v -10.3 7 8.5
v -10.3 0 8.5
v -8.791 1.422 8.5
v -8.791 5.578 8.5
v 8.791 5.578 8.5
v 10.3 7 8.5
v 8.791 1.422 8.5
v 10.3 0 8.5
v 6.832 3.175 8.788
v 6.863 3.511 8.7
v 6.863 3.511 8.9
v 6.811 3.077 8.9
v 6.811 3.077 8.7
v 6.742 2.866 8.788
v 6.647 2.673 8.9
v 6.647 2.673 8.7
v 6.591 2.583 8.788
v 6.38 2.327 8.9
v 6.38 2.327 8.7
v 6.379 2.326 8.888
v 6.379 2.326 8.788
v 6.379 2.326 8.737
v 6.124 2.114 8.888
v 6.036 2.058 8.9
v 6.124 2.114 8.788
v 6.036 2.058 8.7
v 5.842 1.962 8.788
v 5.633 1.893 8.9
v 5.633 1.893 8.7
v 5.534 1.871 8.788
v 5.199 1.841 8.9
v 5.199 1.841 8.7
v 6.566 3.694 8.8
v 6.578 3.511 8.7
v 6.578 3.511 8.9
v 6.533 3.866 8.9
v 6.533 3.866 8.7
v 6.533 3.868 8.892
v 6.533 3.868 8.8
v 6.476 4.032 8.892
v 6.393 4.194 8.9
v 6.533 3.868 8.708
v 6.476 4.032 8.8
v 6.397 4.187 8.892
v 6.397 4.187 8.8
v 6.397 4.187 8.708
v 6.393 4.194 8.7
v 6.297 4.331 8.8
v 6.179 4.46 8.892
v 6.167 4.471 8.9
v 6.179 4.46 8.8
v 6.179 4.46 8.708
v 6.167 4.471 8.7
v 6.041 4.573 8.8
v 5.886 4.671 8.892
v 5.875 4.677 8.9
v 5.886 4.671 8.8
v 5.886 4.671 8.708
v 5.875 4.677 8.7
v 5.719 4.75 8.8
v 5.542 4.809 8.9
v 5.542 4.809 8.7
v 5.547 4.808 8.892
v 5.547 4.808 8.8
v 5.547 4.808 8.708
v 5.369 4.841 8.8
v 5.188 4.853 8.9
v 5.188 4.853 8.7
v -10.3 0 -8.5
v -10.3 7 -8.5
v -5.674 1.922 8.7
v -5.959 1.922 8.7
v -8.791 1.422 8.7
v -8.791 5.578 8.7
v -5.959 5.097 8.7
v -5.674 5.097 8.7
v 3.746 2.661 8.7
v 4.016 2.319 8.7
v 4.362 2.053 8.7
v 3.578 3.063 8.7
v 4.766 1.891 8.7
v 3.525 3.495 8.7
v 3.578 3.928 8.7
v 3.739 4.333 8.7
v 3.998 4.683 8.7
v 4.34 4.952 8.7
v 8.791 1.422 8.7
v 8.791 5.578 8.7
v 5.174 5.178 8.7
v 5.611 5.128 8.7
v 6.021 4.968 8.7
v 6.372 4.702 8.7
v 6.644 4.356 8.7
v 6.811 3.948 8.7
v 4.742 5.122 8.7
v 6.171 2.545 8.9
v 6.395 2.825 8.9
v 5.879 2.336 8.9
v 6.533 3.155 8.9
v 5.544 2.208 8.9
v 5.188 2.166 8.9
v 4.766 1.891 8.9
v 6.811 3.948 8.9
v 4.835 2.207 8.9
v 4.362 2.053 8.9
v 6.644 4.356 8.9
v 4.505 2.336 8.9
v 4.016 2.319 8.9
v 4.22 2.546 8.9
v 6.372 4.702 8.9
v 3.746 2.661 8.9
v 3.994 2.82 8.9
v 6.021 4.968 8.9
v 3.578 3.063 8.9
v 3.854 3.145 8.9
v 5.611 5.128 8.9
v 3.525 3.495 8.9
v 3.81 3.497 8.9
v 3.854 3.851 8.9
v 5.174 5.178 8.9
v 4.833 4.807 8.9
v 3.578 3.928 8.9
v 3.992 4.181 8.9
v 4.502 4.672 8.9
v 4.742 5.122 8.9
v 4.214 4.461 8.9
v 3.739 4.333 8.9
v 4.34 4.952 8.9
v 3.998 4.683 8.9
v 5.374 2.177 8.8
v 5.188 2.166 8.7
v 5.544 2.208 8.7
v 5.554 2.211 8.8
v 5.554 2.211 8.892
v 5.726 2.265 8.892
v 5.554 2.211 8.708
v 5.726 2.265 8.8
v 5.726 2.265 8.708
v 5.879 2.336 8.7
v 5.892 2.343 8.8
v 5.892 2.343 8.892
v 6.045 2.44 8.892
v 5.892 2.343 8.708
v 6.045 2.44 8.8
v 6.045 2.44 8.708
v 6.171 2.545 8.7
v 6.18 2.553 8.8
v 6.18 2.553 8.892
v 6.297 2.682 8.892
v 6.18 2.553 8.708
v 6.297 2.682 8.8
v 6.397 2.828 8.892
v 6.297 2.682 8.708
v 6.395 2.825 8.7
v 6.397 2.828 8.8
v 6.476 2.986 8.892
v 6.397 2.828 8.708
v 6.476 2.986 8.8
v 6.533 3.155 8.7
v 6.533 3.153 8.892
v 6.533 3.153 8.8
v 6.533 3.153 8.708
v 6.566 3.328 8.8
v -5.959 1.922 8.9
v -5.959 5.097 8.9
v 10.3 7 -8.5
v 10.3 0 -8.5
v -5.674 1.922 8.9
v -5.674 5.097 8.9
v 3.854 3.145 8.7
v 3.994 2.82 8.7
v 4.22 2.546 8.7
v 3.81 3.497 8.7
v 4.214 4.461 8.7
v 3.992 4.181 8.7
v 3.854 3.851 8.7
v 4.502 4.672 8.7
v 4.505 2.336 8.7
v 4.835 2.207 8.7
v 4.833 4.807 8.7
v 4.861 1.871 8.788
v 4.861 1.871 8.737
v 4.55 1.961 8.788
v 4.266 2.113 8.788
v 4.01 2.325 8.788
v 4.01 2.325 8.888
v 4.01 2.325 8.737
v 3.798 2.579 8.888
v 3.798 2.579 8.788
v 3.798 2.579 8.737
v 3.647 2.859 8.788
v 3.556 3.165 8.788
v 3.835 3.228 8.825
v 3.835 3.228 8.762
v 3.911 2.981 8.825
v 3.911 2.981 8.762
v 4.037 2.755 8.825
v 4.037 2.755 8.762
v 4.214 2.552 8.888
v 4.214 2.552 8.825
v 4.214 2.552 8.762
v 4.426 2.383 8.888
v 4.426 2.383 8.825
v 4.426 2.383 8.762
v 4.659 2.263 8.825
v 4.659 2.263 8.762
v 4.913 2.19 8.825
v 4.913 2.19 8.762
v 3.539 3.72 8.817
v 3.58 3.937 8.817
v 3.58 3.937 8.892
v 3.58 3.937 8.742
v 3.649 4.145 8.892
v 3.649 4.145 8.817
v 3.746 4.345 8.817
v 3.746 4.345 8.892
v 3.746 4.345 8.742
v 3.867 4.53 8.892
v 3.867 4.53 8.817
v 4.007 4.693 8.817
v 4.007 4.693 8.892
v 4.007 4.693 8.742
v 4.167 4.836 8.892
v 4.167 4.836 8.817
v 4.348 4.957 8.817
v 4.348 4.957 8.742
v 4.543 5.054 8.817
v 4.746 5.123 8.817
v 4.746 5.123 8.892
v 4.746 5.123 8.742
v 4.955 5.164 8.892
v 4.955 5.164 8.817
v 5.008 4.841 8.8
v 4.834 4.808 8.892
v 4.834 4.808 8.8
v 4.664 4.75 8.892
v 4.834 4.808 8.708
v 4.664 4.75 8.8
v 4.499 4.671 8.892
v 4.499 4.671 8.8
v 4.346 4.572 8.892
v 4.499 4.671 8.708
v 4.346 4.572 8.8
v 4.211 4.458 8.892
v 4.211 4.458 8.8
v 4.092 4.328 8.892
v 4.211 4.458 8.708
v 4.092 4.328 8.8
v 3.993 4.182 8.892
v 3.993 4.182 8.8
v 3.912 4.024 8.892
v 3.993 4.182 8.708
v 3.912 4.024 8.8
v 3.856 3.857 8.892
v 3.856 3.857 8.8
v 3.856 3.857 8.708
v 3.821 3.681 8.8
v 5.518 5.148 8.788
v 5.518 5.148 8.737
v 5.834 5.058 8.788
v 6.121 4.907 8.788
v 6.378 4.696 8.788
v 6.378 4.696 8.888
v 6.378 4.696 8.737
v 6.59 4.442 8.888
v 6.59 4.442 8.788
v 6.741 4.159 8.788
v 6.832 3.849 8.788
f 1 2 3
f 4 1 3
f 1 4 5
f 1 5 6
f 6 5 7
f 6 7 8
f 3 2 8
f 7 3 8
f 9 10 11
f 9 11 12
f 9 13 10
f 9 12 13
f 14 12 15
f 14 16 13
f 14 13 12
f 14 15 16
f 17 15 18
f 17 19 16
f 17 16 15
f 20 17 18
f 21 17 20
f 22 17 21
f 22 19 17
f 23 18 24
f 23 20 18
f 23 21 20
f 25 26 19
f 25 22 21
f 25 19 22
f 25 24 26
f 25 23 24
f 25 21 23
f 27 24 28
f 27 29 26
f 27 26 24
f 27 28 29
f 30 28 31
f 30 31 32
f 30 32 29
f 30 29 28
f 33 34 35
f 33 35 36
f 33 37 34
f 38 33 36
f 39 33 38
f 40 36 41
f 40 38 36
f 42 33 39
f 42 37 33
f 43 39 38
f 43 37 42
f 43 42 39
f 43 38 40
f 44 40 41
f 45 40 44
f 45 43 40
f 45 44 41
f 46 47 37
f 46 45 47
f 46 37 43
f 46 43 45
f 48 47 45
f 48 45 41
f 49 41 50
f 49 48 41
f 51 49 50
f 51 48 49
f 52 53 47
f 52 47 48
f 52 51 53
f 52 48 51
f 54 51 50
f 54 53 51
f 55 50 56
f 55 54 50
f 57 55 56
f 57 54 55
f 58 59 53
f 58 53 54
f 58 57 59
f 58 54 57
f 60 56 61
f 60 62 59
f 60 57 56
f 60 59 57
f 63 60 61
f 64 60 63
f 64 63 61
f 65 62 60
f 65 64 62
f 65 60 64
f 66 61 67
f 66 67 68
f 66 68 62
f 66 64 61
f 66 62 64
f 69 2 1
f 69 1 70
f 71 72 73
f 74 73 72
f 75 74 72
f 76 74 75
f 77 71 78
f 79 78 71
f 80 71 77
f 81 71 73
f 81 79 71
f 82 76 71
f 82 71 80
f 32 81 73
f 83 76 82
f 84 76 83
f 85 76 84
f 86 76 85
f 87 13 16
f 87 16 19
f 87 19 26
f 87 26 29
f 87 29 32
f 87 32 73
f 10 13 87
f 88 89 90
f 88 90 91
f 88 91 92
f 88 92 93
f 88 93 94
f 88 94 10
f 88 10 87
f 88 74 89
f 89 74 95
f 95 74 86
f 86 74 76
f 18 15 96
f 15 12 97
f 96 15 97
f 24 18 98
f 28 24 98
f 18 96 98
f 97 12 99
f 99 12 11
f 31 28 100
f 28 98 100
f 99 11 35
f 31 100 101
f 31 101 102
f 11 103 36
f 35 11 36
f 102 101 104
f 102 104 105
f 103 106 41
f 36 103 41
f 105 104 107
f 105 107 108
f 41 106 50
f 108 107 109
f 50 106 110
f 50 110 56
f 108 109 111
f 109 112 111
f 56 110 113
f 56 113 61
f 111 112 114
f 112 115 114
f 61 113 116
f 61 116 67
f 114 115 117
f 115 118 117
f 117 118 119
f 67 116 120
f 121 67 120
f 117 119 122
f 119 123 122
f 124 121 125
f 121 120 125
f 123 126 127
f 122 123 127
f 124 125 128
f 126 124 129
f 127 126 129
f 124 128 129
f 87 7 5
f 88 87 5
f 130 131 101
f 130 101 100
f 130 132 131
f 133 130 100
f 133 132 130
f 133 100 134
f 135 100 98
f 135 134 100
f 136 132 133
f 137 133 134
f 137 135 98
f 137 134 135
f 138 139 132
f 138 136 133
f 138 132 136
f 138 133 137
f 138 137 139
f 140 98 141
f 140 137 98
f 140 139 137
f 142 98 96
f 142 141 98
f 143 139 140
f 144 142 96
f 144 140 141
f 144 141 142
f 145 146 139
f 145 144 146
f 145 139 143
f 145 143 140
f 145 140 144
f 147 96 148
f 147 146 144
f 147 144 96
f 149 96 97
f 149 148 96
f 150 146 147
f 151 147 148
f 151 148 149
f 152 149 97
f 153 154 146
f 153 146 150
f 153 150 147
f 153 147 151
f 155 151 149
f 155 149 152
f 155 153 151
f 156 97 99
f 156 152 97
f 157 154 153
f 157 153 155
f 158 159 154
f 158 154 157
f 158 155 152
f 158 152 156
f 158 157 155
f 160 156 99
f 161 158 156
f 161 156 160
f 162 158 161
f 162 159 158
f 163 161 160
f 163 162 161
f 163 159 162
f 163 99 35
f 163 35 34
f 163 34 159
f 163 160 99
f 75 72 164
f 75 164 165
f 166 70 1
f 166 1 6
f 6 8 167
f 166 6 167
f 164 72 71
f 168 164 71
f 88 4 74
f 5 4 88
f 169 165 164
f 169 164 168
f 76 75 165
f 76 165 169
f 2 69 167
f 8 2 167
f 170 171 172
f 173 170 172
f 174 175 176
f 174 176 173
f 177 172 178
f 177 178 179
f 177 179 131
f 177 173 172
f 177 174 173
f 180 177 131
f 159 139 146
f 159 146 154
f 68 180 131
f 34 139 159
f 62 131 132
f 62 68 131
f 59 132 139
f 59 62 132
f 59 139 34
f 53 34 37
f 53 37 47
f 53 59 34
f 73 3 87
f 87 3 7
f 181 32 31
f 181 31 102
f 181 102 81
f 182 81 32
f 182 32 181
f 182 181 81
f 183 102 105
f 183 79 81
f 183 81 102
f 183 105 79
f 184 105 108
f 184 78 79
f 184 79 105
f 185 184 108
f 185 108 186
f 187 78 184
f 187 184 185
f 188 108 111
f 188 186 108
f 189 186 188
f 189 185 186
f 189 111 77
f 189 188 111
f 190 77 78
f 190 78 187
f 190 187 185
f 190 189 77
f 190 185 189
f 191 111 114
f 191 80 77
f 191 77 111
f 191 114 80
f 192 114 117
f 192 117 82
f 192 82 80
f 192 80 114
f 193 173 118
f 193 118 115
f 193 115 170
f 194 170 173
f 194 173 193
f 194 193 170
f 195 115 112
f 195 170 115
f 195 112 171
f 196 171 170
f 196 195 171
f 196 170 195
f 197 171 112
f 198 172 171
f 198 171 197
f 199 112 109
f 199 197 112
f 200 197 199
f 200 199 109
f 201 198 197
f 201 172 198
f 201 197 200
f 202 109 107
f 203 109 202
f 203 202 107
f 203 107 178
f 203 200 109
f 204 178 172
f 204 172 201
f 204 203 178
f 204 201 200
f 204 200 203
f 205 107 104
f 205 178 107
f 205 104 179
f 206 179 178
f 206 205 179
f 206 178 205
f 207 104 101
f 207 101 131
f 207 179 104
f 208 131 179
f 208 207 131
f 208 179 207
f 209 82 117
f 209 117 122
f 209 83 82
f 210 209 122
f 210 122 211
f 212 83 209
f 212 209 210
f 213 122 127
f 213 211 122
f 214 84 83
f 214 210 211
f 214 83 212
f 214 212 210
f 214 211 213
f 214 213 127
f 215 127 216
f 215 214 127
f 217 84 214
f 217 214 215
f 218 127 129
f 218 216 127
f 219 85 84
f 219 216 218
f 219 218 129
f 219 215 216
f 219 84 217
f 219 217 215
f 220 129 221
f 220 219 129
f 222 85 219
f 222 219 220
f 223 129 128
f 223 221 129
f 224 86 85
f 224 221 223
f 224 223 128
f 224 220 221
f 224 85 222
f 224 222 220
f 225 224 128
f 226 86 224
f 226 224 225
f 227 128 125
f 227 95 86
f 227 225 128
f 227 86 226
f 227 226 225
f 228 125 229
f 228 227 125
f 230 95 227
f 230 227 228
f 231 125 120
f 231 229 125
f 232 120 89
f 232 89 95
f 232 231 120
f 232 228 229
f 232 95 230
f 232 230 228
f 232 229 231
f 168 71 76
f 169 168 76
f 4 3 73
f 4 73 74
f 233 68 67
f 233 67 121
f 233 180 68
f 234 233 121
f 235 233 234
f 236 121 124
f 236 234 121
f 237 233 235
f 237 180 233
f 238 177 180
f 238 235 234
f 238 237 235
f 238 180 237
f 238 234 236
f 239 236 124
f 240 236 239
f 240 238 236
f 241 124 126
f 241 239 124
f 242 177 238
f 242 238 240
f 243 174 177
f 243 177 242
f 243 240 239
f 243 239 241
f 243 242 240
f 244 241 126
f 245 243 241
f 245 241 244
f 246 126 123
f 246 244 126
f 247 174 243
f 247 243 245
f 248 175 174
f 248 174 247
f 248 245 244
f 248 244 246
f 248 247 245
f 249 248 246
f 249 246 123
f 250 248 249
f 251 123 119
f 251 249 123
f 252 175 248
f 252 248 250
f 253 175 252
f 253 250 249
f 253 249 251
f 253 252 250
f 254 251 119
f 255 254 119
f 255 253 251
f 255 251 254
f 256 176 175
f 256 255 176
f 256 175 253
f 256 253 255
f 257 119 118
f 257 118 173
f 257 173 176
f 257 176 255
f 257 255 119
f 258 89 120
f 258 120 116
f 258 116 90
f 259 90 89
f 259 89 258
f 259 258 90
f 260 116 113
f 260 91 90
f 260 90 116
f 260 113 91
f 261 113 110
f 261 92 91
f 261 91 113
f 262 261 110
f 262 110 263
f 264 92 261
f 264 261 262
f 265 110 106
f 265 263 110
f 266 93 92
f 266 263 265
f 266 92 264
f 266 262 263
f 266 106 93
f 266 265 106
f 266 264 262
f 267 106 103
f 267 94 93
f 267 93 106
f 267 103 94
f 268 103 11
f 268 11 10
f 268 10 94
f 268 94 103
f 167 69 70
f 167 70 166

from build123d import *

# Parameters (mm, degrees)
SKETCH1_W           = 20.6
SKETCH1_H           = 17
BOSS_EXTRUDE1_DEPTH = 7
SKETCH2_W           = 17.582410578
SKETCH2_H           = 4.15503942
BOSS_EXTRUDE2_DEPTH = 0.2
SKETCH3_W           = 0.284935897
SKETCH3_H           = 3.175
BOSS_EXTRUDE3_DEPTH = 0.2


with BuildPart() as part:
    # Sketch1 → Boss-Extrude1 (new body)
    with BuildSketch(Plane(origin=(0, 0, 0), x_dir=(1, 0, 0), z_dir=(0, 1, 0))):
        Rectangle(SKETCH1_W, SKETCH1_H)
    extrude(amount=BOSS_EXTRUDE1_DEPTH)

    # Sketch2 → Boss-Extrude2 (add)
    with BuildSketch(Plane.XY.offset(8.5)):
        with Locations((0, 3.5)):
            Rectangle(SKETCH2_W, SKETCH2_H)
    extrude(amount=BOSS_EXTRUDE2_DEPTH)

    # Sketch3 → Boss-Extrude3 (add)
    # profile 1 of 2: a face of its own
    with BuildSketch(Plane.XY.offset(8.7)):
        with Locations((-5.816789994, 3.509432337)):
            Rectangle(SKETCH3_W, SKETCH3_H)
    # profile 2 of 2: a face of its own
    with BuildSketch(Plane.XY.offset(8.7)):
        with BuildLine():
            add(Edge.make_bspline(
                [(5.173594622, 5.178342594), (5.232384832, 5.176853538), (5.347853656, 5.173928908), (5.517557313, 5.151541436), (5.679568578, 5.112810618), (5.835207204, 5.061227769), (5.982611547, 4.992417005), (6.122891114, 4.909245478), (6.255712135, 4.810841833), (6.379284388, 4.697966749), (6.492366051, 4.575154616), (6.591993819, 4.444092511), (6.675489328, 4.305572884), (6.744056435, 4.160011987), (6.797848745, 4.007739016), (6.834968163, 3.847942171), (6.8586792, 3.681656816), (6.861451226, 3.568239589), (6.862857443, 3.510704373)],
                knots=[0, 0, 0, 0, 1.065120563, 2.091984664, 3.0946048, 4.079830382, 5.057816894, 6.036188127, 7.030412546, 8.04752943, 9.064399622, 10.05169764, 11.02544977, 11.989514704, 12.962713494, 13.945757189, 14.957906945, 16, 16, 16, 16], degree=3))
            add(Edge.make_bspline(
                [(6.862857443, 3.510704373), (6.861451432, 3.453592975), (6.858680023, 3.341019794), (6.834941204, 3.175789669), (6.797711154, 3.016957394), (6.744555969, 2.864788124), (6.676315714, 2.719121334), (6.592264237, 2.580340311), (6.493257568, 2.448399559), (6.38058421, 2.324744499), (6.257756122, 2.211353936), (6.126011523, 2.112548956), (5.988313297, 2.027527786), (5.84288949, 1.95968831), (5.691668742, 1.905466639), (5.533297635, 1.868498182), (5.368518261, 1.844652079), (5.256149565, 1.841913853), (5.199035327, 1.840522081)],
                knots=[0, 0, 0, 0, 1.043624062, 2.057103931, 3.04512605, 4.022047818, 4.998200453, 5.980619268, 6.982898556, 8.009068085, 9.034988726, 10.034168286, 11.015286542, 11.987931943, 12.962482838, 13.94673481, 14.956375938, 16, 16, 16, 16], degree=3))
            add(Edge.make_bspline(
                [(5.199035327, 1.840522081), (5.141500409, 1.841927596), (5.028083771, 1.844698241), (4.86158946, 1.868448515), (4.701680364, 1.905588127), (4.548813774, 1.958664544), (4.402904445, 2.027260174), (4.263667012, 2.110902718), (4.131660357, 2.210150625), (4.007978916, 2.322787446), (3.894813572, 2.445407354), (3.796153281, 2.576792714), (3.712491928, 2.714365878), (3.64412662, 2.858508632), (3.590002431, 3.008524155), (3.553077346, 3.165413131), (3.529186876, 3.328281112), (3.526433836, 3.439172884), (3.52503693, 3.49543995)],
                knots=[0, 0, 0, 0, 1.053102029, 2.075944431, 3.073151272, 4.055350789, 5.033113405, 6.020478099, 7.024410459, 8.052272461, 9.079885166, 10.07527673, 11.055994387, 12.023226415, 12.992069828, 13.970394897, 14.97016774, 16, 16, 16, 16], degree=3))
            add(Edge.make_bspline(
                [(3.52503693, 3.49543995), (3.525521921, 3.533206728), (3.526485784, 3.60826384), (3.538089676, 3.719721399), (3.554927791, 3.829386495), (3.579059526, 3.936947284), (3.610620538, 4.042140463), (3.647860591, 4.145691512), (3.693344594, 4.246551033), (3.744762039, 4.345196824), (3.802149536, 4.440091139), (3.865536823, 4.529789046), (3.932697479, 4.615043236), (4.006324272, 4.693644447), (4.083990618, 4.767879264), (4.166956433, 4.836606871), (4.254715469, 4.900447005), (4.347645342, 4.957978315), (4.443456206, 5.010011244), (4.542222997, 5.054662494), (4.642604315, 5.092985707), (4.745070317, 5.124047027), (4.849348903, 5.148568946), (4.955667665, 5.165267045), (5.063941902, 5.176900534), (5.136886455, 5.177859839), (5.173594622, 5.178342594)],
                knots=[0, 0, 0, 0, 1.037015668, 2.060948919, 3.074880161, 4.083647147, 5.086022904, 6.090072063, 7.104153813, 8.122640571, 9.144368836, 10.147691507, 11.138137339, 12.123020368, 13.103399296, 14.087645067, 15.080126199, 16.082011238, 17.087798457, 18.072939717, 19.057185487, 20.037253025, 21.01195951, 21.997135196, 22.992090687, 24, 24, 24, 24], degree=3))
        make_face()
        with BuildLine():
            add(Edge.make_bspline(
                [(5.18758701, 4.852701568), (5.157456592, 4.852334275), (5.097483806, 4.8516032), (5.008325691, 4.841973229), (4.920340151, 4.828248258), (4.833509015, 4.808670736), (4.748195596, 4.78199706), (4.663604668, 4.751298521), (4.580507612, 4.713905103), (4.499178756, 4.671657007), (4.420334366, 4.624894772), (4.34593713, 4.573213241), (4.275794445, 4.517824409), (4.210078054, 4.458599014), (4.148980919, 4.395235447), (4.091300511, 4.328694308), (4.039348819, 4.257073664), (3.991736903, 4.182315652), (3.949130362, 4.104517646), (3.911243219, 4.0244987), (3.880251582, 3.941606084), (3.854976427, 3.856739098), (3.834021598, 3.770032153), (3.820746539, 3.68082749), (3.811010755, 3.589573352), (3.810321467, 3.527904099), (3.809972827, 3.496711985)],
                knots=[0, 0, 0, 0, 1.008559885, 2.007477868, 2.99961109, 3.989939068, 4.984837346, 5.991145699, 7.001802488, 8.033829008, 9.059044045, 10.069351652, 11.065060232, 12.050310815, 13.029377138, 14.011219647, 14.996725999, 15.989392538, 16.977580475, 17.965360261, 18.951710183, 19.937753436, 20.929683414, 21.935841486, 22.955955122, 24, 24, 24, 24], degree=3))
            add(Edge.make_bspline(
                [(3.809972827, 3.496711985), (3.811129309, 3.450844827), (3.813404467, 3.360609939), (3.83332312, 3.228377409), (3.864004482, 3.10129732), (3.909232236, 2.980065017), (3.965793151, 2.863638418), (4.035667544, 2.753050351), (4.118452572, 2.648270929), (4.212490199, 2.55003165), (4.315290083, 2.460364384), (4.42444906, 2.381657578), (4.538797689, 2.315063994), (4.658634166, 2.26081225), (4.783318719, 2.217822988), (4.913654784, 2.18836023), (5.048774129, 2.168969638), (5.140876938, 2.167107495), (5.18758701, 2.166163107)],
                knots=[0, 0, 0, 0, 1.032063989, 2.030389145, 3.003944642, 3.970395727, 4.937377036, 5.913328081, 6.909231446, 7.93887556, 8.970685674, 9.976071282, 10.964166581, 11.944589148, 12.933237628, 13.927779006, 14.949070134, 16, 16, 16, 16], degree=3))
            add(Edge.make_bspline(
                [(5.18758701, 2.166163107), (5.218982772, 2.166594457), (5.281249998, 2.167449954), (5.373865222, 2.176066611), (5.464811928, 2.189884093), (5.553962553, 2.20977833), (5.641215918, 2.234676868), (5.726936204, 2.264256735), (5.810210367, 2.301160398), (5.892088934, 2.341934612), (5.970462668, 2.388416755), (6.045279758, 2.438344219), (6.114654397, 2.493651468), (6.180321626, 2.551996912), (6.241669601, 2.614556974), (6.298283465, 2.681250318), (6.349972585, 2.752497914), (6.397566421, 2.827142532), (6.440023667, 2.905153419), (6.477016135, 2.985462484), (6.508399755, 3.067871976), (6.533734898, 3.152500758), (6.553588139, 3.2391881), (6.56726778, 3.328050071), (6.576836721, 3.418908903), (6.57755797, 3.480362258), (6.577921545, 3.51134039)],
                knots=[0, 0, 0, 0, 1.047197238, 2.076906641, 3.100256066, 4.114471768, 5.12198147, 6.126382909, 7.136867548, 8.15857795, 9.17633901, 10.174870724, 11.156907918, 12.133735059, 13.104061851, 14.077631395, 15.04955518, 16.038496417, 17.029181396, 18.010275684, 18.986308667, 19.968651475, 20.955262928, 21.950658345, 22.966943676, 24, 24, 24, 24], degree=3))
            add(Edge.make_bspline(
                [(6.577921545, 3.51134039), (6.577557678, 3.542106598), (6.576835882, 3.603137038), (6.567272351, 3.693362208), (6.553573686, 3.781584765), (6.533831801, 3.867458357), (6.508386304, 3.951004876), (6.477010655, 4.032145855), (6.440012562, 4.111183575), (6.397550815, 4.187922687), (6.349820747, 4.261559771), (6.297665255, 4.331956245), (6.240183832, 4.397790089), (6.179018795, 4.460686561), (6.112642349, 4.519304218), (6.041355168, 4.573662505), (5.966022689, 4.625073261), (5.886260125, 4.671451449), (5.803942396, 4.714281503), (5.719474734, 4.750976342), (5.633814051, 4.782156764), (5.547178177, 4.80875144), (5.458837904, 4.828171581), (5.369390145, 4.841985598), (5.278958653, 4.851599848), (5.218140875, 4.852333163), (5.18758701, 4.852701568)],
                knots=[0, 0, 0, 0, 1.02996197, 2.043119294, 3.035359645, 4.018872909, 4.991431989, 5.957985074, 6.929999688, 7.912076566, 8.892894881, 9.867085534, 10.843653904, 11.817741046, 12.803660682, 13.806313499, 14.818574707, 15.856120519, 16.894564902, 17.924820532, 18.937903209, 19.946497019, 20.957711757, 21.963978472, 22.977135795, 24, 24, 24, 24], degree=3))
        make_face(mode=Mode.SUBTRACT)
    extrude(amount=BOSS_EXTRUDE3_DEPTH)


solid = part.part
